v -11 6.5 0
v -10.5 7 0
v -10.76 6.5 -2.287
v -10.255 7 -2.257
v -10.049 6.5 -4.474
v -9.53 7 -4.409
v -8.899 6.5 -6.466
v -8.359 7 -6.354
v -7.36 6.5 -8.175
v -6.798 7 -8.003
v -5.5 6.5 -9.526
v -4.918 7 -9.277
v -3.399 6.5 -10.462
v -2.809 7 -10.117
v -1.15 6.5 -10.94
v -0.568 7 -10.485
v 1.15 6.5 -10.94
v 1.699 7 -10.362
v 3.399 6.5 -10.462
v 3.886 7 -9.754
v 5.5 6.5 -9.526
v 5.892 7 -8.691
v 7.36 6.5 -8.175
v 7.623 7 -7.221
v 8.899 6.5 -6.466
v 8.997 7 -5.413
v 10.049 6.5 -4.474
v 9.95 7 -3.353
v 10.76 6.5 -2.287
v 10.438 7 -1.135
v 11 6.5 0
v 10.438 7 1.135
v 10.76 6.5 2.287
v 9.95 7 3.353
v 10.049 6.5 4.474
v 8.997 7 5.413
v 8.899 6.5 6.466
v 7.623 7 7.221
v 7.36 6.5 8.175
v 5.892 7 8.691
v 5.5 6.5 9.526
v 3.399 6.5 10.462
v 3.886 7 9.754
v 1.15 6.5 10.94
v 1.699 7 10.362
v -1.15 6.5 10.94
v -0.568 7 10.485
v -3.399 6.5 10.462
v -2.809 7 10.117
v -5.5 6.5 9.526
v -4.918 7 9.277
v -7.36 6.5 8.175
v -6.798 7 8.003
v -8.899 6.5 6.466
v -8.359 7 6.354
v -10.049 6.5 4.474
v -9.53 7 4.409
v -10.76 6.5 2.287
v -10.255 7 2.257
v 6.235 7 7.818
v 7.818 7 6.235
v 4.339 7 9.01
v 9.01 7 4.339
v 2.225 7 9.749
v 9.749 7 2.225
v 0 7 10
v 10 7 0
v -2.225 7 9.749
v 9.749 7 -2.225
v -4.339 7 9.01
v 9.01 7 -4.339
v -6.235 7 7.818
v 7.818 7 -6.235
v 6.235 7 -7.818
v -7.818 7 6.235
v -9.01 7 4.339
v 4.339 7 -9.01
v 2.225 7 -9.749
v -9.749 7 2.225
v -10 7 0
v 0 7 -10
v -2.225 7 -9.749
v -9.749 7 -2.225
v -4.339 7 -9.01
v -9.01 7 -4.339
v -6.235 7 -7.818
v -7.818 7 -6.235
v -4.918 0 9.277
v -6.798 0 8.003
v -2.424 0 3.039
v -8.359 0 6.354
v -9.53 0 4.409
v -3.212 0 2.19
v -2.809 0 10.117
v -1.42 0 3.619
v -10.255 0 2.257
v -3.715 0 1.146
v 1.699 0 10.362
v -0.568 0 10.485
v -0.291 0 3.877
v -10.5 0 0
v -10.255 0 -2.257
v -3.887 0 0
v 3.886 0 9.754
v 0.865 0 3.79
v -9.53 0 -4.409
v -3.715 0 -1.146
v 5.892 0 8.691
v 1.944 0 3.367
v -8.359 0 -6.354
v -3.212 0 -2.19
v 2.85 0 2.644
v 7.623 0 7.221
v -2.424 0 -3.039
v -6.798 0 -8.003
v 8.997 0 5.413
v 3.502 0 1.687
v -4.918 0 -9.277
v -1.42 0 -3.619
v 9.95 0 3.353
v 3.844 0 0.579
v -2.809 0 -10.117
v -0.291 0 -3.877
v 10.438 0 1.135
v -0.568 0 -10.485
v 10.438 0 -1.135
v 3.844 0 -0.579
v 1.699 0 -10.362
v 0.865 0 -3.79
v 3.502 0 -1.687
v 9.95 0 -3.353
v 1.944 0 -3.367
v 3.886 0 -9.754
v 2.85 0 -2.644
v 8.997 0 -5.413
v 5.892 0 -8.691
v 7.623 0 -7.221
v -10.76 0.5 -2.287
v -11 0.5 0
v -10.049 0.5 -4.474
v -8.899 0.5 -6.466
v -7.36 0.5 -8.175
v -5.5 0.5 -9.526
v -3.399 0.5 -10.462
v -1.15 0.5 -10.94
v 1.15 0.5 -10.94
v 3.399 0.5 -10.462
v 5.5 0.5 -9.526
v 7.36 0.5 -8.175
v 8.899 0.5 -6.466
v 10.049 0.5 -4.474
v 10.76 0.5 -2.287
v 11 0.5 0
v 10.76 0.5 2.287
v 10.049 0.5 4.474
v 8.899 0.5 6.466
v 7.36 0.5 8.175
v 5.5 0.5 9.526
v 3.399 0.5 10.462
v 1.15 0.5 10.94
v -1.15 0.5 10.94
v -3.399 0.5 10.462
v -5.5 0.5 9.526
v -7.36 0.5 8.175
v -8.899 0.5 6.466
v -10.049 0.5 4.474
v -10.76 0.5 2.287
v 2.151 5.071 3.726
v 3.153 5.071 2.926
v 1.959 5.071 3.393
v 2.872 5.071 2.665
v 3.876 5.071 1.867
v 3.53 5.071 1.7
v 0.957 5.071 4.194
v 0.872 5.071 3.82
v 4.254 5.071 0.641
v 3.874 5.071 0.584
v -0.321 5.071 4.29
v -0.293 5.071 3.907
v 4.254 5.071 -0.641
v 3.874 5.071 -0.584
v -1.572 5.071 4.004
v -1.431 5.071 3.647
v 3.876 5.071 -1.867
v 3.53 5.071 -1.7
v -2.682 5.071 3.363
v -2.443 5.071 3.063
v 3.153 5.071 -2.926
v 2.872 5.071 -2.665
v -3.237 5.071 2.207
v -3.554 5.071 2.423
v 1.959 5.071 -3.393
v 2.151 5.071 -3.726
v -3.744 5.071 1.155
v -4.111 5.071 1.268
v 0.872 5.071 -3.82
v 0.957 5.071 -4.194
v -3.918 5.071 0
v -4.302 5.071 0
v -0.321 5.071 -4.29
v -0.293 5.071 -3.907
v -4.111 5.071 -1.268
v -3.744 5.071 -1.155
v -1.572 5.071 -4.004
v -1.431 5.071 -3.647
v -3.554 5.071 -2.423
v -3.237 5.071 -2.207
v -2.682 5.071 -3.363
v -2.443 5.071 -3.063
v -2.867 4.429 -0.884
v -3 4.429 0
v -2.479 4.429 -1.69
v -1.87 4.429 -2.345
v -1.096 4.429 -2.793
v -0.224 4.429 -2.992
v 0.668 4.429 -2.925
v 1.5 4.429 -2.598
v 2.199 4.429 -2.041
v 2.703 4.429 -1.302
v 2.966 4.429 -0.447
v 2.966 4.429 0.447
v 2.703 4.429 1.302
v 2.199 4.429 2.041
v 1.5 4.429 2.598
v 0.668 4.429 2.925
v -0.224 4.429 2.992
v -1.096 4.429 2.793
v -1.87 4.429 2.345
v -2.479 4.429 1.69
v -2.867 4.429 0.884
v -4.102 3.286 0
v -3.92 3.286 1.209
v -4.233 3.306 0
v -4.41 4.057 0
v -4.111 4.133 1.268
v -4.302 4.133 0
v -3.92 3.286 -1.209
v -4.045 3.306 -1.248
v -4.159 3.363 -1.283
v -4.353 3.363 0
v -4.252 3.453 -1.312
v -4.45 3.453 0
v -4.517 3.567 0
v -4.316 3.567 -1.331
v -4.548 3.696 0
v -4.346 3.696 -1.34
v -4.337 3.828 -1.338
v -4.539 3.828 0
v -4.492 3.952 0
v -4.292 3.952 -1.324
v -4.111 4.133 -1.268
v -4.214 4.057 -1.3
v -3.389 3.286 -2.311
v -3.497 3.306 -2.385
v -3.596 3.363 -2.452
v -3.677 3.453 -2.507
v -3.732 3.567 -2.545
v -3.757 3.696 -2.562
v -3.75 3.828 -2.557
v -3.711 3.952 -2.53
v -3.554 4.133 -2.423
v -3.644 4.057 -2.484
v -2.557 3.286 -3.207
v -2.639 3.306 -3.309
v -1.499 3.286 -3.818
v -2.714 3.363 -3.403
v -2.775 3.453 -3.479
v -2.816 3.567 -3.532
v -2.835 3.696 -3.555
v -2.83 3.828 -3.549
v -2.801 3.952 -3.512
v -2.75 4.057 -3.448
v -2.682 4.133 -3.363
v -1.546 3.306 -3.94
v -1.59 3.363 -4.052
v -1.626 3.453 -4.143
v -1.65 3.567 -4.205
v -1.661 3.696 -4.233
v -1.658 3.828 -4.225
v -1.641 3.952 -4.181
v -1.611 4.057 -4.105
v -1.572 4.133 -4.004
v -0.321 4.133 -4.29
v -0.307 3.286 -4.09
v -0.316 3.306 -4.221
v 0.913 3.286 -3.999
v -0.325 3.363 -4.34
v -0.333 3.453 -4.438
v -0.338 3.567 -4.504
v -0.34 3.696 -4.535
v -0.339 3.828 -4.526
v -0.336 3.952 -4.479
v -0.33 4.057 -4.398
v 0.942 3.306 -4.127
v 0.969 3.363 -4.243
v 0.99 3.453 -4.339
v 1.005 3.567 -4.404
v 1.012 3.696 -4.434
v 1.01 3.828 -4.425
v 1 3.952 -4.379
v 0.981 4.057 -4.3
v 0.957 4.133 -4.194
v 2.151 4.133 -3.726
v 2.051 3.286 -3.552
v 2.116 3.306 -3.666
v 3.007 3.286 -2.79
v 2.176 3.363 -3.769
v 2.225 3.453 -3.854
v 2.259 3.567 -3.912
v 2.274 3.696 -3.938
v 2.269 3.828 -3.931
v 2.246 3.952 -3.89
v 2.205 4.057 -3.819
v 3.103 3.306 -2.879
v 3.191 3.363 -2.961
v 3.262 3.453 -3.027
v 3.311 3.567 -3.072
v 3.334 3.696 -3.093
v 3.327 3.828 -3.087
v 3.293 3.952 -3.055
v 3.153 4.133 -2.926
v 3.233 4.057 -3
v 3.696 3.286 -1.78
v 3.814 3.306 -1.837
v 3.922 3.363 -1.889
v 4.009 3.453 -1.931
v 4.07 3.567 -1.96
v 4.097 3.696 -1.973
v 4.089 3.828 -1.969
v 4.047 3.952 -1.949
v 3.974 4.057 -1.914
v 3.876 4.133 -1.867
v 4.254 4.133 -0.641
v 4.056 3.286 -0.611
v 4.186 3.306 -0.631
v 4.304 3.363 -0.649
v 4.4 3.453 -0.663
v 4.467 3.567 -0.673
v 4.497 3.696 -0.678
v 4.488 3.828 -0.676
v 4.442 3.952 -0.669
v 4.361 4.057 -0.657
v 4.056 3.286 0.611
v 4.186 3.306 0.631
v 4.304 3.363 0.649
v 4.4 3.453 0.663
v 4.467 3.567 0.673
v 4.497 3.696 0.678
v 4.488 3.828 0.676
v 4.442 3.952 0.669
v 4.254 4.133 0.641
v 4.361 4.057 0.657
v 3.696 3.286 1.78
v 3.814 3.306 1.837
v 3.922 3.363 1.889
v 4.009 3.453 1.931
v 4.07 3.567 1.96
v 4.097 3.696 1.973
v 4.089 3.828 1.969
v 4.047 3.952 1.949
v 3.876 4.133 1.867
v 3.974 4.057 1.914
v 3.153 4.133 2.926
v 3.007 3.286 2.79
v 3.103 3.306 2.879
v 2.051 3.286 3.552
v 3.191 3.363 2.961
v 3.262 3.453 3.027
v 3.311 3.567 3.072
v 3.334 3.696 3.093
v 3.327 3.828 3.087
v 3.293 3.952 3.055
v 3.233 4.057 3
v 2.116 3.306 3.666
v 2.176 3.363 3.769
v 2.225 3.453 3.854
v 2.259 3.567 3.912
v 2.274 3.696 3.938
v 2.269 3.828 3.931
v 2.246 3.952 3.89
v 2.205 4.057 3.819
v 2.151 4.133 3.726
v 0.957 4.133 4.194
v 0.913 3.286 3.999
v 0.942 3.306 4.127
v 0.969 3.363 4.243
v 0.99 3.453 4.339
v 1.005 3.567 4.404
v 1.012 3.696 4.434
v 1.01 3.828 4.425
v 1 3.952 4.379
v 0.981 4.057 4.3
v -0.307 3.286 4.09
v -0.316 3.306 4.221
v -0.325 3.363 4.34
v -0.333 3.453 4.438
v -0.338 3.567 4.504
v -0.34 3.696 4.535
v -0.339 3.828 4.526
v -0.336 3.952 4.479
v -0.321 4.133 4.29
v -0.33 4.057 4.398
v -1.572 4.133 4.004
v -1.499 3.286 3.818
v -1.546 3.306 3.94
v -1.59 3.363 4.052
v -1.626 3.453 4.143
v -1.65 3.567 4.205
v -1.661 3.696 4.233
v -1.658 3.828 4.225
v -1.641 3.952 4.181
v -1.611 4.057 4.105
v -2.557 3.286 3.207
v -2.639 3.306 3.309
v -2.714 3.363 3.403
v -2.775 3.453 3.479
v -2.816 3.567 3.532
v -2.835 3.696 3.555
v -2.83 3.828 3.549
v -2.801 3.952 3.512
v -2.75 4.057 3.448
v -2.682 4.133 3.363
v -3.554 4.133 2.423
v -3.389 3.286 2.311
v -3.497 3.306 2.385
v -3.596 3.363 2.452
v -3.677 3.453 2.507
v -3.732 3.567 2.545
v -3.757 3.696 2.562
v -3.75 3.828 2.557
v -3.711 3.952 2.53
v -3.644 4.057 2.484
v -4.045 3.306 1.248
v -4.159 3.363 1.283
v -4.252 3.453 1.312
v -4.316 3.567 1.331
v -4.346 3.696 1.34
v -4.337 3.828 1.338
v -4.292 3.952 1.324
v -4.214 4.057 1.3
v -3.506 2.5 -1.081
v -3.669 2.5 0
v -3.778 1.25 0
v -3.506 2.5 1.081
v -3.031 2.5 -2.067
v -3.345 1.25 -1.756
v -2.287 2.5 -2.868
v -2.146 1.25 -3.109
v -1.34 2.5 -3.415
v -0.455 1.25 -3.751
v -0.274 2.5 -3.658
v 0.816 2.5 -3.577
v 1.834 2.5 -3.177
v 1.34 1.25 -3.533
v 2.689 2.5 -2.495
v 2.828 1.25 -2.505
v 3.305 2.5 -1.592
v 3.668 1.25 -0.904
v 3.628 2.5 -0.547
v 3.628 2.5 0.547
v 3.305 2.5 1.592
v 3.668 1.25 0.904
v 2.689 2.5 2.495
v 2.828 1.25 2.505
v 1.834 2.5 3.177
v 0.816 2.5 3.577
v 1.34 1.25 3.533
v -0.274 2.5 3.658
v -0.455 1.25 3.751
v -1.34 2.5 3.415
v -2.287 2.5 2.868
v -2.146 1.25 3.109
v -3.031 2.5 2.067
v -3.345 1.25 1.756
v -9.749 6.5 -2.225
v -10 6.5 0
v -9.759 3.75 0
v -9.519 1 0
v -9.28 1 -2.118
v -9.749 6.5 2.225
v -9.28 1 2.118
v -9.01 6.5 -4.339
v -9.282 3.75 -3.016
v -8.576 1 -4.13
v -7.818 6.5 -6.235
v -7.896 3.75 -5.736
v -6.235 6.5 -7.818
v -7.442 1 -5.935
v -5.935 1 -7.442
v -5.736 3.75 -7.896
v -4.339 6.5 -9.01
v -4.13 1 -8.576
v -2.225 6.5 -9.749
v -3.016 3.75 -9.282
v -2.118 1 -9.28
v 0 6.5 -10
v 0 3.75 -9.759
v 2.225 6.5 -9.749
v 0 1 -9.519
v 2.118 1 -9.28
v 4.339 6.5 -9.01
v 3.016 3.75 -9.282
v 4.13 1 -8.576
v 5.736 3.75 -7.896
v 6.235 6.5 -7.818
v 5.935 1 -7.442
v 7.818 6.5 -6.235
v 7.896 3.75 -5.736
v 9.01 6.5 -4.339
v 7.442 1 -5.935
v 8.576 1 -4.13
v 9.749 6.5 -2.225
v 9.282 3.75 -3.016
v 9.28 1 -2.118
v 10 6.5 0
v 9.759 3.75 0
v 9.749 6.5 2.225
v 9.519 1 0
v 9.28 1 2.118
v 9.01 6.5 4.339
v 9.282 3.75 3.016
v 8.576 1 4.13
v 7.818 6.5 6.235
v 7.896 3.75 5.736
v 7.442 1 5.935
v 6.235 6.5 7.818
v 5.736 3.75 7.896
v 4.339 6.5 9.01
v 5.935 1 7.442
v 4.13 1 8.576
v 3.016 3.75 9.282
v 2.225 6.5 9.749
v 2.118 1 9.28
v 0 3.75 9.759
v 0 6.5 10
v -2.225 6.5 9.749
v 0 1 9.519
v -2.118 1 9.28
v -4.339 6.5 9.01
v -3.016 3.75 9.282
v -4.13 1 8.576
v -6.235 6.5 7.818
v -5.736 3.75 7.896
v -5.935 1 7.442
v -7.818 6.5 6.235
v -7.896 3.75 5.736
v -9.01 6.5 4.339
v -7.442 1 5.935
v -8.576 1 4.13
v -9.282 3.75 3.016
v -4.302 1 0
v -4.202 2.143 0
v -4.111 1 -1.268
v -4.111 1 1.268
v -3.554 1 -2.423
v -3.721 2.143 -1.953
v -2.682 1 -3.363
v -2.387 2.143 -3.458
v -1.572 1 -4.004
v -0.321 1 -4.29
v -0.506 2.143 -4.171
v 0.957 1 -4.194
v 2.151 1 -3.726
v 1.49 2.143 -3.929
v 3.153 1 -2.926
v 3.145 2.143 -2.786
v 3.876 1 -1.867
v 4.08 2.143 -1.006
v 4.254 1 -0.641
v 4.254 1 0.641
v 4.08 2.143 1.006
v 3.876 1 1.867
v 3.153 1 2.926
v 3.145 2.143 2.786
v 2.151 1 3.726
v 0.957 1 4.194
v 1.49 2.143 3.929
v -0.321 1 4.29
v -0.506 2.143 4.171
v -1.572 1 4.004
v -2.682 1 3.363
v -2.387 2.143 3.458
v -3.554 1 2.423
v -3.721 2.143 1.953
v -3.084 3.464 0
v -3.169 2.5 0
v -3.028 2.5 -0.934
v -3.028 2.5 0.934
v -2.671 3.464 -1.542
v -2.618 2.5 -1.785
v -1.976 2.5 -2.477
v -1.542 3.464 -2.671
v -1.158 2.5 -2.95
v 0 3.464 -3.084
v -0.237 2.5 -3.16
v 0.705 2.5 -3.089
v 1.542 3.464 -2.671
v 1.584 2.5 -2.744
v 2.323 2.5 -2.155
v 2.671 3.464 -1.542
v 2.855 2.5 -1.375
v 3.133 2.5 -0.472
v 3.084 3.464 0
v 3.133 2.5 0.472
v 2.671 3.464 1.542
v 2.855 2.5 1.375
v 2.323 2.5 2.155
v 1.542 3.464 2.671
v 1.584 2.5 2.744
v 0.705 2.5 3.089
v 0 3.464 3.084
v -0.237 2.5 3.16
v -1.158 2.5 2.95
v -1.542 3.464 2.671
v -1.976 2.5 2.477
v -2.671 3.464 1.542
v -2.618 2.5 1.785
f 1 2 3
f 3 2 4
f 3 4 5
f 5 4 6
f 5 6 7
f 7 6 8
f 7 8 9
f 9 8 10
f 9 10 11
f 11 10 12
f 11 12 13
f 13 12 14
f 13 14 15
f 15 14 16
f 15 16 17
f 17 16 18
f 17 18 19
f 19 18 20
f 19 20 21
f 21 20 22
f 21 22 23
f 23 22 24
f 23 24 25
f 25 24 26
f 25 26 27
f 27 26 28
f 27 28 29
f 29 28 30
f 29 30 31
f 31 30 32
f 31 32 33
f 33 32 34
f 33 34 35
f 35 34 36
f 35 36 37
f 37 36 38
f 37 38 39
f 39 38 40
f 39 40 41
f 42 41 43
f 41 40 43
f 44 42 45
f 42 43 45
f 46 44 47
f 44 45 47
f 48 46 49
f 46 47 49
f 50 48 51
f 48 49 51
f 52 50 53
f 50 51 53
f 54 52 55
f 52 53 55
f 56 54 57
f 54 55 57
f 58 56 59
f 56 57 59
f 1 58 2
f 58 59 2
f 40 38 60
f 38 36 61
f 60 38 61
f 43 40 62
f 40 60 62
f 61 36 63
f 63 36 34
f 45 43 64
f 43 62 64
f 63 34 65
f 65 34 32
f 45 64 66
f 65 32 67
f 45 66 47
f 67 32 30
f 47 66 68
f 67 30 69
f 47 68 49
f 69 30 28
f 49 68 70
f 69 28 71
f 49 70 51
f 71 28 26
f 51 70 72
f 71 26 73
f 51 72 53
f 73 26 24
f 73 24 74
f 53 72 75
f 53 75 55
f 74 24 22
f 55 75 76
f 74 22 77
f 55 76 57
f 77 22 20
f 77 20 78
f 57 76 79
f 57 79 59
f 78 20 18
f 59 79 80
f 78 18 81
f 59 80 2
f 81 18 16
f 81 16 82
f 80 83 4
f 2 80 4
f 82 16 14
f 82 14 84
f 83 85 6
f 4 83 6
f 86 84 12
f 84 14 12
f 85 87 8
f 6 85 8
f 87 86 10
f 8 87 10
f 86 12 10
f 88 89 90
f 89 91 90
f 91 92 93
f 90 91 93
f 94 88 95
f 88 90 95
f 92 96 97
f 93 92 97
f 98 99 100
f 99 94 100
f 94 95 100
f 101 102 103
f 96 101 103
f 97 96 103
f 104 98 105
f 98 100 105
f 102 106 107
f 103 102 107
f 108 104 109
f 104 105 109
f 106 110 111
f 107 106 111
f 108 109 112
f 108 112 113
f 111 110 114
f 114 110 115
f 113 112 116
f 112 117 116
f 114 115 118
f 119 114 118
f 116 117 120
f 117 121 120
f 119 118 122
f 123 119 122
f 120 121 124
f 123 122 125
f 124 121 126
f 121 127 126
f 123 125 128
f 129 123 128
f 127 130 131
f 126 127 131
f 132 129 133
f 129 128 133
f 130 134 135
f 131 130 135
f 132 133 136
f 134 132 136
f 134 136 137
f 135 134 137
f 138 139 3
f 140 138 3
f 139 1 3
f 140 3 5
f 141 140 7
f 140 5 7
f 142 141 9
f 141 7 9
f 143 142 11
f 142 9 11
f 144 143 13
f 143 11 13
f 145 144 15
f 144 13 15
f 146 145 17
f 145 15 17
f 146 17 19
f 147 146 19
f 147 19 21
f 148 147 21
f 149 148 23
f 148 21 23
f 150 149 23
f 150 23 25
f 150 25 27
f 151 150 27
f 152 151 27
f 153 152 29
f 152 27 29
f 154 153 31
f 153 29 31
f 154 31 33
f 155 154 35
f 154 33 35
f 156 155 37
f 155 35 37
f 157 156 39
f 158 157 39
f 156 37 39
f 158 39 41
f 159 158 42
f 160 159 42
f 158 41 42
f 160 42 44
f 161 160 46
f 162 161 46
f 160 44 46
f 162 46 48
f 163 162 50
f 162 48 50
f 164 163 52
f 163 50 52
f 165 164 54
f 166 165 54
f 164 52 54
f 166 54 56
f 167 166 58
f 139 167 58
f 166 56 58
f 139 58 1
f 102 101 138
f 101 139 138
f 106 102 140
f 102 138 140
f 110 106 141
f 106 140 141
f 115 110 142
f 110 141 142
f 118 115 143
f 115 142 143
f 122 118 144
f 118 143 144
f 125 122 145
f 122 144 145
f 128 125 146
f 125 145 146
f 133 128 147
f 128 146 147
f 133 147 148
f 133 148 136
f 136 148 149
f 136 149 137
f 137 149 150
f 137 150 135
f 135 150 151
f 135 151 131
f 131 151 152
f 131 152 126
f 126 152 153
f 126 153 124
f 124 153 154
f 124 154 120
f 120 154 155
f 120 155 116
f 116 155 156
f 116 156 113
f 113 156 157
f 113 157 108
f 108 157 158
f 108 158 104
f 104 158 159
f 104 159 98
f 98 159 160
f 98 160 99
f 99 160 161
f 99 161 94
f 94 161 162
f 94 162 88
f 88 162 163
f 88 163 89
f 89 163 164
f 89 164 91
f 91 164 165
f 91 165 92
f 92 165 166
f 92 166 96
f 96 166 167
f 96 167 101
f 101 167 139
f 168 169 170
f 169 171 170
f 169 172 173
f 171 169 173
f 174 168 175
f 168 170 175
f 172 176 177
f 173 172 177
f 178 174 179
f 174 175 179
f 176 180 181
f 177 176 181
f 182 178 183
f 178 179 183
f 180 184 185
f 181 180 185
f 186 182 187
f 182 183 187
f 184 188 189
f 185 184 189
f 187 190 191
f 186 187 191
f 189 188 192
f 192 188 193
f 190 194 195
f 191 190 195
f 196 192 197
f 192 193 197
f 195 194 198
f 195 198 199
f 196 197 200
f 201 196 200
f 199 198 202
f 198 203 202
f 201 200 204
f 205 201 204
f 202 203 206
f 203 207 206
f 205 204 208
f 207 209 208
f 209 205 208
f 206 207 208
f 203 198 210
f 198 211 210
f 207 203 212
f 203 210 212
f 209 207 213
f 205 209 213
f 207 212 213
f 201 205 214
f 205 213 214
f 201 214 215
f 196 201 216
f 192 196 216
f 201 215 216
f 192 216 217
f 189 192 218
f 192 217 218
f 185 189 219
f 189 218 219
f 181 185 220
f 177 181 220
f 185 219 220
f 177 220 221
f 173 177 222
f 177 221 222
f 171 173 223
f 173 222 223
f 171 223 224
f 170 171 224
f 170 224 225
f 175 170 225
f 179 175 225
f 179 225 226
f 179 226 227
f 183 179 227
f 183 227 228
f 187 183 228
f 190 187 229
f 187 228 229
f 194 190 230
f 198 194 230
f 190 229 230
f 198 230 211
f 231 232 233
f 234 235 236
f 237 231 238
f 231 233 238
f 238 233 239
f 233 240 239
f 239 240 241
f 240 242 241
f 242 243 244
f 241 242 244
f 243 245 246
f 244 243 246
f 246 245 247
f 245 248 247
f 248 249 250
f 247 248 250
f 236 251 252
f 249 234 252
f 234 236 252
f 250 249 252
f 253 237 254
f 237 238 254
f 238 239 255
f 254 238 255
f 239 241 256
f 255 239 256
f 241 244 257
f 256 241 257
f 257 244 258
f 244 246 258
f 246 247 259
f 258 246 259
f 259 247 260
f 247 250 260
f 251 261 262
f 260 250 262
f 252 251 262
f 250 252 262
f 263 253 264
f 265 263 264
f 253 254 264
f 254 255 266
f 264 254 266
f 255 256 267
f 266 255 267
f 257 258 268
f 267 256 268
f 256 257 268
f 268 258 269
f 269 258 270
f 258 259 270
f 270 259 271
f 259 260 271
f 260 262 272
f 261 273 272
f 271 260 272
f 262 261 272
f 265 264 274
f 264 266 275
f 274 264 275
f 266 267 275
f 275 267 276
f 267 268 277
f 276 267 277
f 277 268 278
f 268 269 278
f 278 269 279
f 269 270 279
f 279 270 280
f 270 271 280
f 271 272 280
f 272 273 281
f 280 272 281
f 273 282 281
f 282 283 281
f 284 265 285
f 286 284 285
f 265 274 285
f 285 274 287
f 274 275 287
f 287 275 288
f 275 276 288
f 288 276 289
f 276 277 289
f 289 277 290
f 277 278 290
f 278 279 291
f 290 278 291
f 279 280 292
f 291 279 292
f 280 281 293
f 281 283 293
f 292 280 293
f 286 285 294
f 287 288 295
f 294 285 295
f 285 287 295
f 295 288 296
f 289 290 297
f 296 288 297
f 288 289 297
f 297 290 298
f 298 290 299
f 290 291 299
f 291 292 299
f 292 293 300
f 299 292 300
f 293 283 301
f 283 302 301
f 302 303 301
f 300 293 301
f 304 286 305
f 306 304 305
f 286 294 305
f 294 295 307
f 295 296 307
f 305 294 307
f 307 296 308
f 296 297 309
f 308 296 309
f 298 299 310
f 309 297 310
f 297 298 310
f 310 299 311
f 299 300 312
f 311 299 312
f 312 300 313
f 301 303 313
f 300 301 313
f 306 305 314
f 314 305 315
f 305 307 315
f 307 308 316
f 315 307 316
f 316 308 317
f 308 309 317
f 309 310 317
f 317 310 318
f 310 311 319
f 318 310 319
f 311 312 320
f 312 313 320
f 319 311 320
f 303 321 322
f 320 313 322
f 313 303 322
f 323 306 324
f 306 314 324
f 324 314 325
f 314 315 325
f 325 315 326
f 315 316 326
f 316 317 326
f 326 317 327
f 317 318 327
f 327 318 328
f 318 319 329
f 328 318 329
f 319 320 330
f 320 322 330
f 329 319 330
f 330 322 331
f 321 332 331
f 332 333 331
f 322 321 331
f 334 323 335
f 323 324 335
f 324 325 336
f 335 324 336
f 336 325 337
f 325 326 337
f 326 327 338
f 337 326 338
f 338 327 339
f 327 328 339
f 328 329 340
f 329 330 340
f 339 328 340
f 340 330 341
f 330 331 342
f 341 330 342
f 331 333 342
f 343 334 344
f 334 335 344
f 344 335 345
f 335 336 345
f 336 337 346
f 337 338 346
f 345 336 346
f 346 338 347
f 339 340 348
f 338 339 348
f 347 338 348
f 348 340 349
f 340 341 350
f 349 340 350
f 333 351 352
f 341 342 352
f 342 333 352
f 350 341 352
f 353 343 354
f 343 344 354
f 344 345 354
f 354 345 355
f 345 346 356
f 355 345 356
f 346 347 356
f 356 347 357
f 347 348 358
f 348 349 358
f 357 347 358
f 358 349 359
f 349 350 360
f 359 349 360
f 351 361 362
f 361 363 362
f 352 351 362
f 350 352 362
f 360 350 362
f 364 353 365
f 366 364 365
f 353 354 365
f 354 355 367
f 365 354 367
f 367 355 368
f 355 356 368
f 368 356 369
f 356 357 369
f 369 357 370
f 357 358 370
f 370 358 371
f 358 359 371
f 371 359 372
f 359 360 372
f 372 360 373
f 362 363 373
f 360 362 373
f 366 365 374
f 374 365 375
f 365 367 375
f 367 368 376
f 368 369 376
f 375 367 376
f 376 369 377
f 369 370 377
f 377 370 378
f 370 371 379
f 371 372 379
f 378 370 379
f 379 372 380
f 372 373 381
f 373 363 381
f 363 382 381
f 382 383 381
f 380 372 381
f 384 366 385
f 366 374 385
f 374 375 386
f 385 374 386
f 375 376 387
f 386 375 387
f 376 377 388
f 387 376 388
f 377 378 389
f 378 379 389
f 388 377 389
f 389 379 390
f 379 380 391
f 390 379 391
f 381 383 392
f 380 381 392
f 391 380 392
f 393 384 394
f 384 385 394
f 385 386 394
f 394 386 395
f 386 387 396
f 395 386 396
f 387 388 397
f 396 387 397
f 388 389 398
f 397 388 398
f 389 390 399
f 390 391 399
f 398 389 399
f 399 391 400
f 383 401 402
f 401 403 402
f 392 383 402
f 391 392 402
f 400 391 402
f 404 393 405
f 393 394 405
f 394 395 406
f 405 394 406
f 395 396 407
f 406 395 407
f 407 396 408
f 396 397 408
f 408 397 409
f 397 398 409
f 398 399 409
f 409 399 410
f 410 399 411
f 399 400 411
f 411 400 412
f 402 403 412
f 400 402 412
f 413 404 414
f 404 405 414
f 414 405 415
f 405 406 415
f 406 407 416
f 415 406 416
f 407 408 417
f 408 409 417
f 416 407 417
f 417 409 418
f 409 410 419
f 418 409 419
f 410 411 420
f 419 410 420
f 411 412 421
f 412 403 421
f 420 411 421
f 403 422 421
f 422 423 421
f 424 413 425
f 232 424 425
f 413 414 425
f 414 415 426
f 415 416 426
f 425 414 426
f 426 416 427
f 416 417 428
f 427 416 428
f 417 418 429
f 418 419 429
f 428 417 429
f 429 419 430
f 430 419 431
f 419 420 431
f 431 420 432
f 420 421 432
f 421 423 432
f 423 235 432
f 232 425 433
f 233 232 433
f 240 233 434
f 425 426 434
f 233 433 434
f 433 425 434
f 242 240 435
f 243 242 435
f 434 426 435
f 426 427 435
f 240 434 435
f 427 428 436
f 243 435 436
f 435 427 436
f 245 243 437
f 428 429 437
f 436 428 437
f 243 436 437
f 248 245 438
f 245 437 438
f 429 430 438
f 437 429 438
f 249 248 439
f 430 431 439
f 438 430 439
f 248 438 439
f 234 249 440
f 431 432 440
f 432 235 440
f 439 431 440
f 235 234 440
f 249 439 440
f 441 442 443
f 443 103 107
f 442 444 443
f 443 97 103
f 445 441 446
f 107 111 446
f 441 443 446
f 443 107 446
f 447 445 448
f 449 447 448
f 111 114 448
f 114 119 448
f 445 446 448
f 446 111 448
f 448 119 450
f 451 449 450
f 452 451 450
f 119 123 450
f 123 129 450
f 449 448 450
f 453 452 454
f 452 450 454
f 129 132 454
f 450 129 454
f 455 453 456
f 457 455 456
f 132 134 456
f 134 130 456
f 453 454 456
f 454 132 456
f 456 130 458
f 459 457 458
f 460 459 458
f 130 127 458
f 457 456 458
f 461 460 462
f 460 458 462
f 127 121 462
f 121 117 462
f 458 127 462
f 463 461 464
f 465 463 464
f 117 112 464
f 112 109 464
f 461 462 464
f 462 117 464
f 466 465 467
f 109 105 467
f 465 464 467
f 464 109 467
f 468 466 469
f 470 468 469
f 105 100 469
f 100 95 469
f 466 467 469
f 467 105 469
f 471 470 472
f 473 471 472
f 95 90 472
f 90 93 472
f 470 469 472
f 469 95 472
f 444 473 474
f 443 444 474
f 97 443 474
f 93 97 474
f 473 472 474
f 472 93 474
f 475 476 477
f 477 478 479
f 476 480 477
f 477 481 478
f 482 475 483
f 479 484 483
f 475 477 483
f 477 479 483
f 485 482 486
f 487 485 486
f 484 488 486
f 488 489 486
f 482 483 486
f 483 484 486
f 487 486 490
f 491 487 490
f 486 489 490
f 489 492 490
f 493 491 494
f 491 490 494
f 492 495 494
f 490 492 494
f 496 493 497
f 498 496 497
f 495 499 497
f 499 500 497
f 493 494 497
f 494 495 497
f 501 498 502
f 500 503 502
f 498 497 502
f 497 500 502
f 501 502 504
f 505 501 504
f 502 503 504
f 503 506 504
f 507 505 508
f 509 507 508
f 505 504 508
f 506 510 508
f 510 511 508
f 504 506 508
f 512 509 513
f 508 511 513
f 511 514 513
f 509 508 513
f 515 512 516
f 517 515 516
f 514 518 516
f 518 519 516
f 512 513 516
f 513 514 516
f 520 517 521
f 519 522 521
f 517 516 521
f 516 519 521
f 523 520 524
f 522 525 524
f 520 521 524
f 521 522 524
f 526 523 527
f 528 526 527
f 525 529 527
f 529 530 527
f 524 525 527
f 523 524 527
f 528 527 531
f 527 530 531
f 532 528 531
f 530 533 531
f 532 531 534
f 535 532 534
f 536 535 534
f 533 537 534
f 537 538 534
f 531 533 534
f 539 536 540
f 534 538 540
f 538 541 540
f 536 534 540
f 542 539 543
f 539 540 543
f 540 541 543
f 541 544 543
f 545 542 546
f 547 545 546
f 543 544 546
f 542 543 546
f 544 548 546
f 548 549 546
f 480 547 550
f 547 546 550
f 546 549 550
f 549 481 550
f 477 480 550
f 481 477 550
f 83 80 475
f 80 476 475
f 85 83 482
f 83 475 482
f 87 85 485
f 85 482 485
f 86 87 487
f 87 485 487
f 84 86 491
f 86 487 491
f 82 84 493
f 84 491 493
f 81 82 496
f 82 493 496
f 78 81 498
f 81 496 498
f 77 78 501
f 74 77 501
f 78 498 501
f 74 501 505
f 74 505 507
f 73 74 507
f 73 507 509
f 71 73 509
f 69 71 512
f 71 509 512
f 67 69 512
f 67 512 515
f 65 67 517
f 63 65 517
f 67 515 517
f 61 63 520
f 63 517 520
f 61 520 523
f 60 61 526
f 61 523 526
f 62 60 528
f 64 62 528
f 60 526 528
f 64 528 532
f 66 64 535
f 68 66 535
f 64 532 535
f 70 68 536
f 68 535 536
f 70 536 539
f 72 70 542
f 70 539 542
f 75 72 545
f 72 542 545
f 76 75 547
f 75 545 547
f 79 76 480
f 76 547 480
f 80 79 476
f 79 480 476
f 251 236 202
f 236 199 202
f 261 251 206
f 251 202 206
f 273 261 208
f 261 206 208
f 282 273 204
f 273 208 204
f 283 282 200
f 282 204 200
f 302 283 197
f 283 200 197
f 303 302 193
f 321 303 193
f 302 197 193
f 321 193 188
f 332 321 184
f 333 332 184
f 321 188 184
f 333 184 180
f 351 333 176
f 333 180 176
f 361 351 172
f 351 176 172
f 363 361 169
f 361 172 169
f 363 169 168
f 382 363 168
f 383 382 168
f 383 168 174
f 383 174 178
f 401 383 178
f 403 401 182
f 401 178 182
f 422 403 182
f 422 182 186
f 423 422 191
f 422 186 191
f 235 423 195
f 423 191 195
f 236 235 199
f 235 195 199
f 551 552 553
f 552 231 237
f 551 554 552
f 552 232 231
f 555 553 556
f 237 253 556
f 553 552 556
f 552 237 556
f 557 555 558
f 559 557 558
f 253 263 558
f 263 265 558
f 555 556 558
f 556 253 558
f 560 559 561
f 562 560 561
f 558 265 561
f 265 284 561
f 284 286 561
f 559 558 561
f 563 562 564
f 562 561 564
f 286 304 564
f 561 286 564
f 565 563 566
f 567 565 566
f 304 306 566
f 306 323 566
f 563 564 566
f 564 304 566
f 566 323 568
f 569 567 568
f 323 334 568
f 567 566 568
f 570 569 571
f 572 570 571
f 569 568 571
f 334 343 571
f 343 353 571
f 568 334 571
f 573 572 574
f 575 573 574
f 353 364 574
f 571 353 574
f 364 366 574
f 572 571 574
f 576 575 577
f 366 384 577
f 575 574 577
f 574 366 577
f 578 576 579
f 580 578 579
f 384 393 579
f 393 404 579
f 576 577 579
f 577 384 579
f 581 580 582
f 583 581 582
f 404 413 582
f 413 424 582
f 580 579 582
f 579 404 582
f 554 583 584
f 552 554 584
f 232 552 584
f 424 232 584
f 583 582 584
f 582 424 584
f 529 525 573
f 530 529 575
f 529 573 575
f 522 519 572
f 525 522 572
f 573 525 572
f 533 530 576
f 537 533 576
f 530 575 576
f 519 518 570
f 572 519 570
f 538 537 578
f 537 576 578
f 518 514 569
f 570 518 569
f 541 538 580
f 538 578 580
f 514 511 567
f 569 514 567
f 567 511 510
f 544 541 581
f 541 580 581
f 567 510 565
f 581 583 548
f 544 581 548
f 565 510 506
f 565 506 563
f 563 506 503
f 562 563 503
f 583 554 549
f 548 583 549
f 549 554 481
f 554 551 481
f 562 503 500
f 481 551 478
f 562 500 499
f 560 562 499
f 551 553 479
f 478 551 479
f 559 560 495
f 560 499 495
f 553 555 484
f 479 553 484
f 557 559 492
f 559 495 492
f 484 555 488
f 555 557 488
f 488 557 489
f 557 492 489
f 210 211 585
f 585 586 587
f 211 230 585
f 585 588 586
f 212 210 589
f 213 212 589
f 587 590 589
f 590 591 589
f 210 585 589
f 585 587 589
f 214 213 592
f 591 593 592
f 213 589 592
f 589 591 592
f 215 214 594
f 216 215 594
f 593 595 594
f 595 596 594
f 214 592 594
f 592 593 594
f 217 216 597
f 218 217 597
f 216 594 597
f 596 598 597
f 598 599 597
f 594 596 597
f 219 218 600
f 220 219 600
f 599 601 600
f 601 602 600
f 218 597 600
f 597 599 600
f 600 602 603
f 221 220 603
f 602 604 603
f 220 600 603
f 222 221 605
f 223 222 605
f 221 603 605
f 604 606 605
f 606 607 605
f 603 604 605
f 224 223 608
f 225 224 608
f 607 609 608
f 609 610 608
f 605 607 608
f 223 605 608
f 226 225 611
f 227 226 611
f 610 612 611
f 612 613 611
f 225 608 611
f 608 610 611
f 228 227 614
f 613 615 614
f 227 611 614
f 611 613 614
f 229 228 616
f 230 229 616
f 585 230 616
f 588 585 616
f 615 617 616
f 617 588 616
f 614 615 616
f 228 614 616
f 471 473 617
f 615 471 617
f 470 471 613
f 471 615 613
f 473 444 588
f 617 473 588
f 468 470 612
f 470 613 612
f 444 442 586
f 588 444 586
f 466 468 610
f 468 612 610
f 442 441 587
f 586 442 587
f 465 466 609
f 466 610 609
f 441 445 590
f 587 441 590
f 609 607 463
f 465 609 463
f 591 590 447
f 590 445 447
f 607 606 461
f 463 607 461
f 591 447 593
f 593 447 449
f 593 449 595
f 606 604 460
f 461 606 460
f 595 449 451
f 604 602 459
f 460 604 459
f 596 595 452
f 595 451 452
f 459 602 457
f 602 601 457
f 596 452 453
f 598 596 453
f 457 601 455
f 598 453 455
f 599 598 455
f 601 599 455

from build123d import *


with BuildPart() as part:
    # 草图1 → 旋转1 (revolve)
    with BuildSketch(Plane.XY):
        with BuildLine():
            Line((-9.518812351, 1), (-4.301871051, 1))
            Line((-4.301871051, 1), (-4.101871051, 3.286010461))
            ThreePointArc((-4.101871051, 3.286010461), (-4.537121231, 3.630475426), (-4.301871051, 4.133224056))
            Line((-4.301871051, 4.133224056), (-4.301871051, 5.071428571))
            Line((-4.301871051, 5.071428571), (-3.918095147, 5.071428571))
            Line((-3.918095147, 5.071428571), (-3, 4.428571429))
            Line((-3, 4.428571429), (-3.168728137, 2.5))
            Line((-3.168728137, 2.5), (-3.668728137, 2.5))
            Line((-3.668728137, 2.5), (-3.887449796, 0))
            Line((-3.887449796, 0), (-10.5, 0))
            Line((-10.5, 0), (-11, 0.5))
            Line((-11, 0.5), (-11, 6.5))
            Line((-11, 6.5), (-10.5, 7))
            Line((-10.5, 7), (-10, 7))
            Line((-10, 7), (-10, 6.5))
            Line((-10, 6.5), (-9.518812351, 1))
        make_face()
    revolve(axis=Axis((0, 5.836193369, 0), (0, -1, 0)))


solid = part.part
